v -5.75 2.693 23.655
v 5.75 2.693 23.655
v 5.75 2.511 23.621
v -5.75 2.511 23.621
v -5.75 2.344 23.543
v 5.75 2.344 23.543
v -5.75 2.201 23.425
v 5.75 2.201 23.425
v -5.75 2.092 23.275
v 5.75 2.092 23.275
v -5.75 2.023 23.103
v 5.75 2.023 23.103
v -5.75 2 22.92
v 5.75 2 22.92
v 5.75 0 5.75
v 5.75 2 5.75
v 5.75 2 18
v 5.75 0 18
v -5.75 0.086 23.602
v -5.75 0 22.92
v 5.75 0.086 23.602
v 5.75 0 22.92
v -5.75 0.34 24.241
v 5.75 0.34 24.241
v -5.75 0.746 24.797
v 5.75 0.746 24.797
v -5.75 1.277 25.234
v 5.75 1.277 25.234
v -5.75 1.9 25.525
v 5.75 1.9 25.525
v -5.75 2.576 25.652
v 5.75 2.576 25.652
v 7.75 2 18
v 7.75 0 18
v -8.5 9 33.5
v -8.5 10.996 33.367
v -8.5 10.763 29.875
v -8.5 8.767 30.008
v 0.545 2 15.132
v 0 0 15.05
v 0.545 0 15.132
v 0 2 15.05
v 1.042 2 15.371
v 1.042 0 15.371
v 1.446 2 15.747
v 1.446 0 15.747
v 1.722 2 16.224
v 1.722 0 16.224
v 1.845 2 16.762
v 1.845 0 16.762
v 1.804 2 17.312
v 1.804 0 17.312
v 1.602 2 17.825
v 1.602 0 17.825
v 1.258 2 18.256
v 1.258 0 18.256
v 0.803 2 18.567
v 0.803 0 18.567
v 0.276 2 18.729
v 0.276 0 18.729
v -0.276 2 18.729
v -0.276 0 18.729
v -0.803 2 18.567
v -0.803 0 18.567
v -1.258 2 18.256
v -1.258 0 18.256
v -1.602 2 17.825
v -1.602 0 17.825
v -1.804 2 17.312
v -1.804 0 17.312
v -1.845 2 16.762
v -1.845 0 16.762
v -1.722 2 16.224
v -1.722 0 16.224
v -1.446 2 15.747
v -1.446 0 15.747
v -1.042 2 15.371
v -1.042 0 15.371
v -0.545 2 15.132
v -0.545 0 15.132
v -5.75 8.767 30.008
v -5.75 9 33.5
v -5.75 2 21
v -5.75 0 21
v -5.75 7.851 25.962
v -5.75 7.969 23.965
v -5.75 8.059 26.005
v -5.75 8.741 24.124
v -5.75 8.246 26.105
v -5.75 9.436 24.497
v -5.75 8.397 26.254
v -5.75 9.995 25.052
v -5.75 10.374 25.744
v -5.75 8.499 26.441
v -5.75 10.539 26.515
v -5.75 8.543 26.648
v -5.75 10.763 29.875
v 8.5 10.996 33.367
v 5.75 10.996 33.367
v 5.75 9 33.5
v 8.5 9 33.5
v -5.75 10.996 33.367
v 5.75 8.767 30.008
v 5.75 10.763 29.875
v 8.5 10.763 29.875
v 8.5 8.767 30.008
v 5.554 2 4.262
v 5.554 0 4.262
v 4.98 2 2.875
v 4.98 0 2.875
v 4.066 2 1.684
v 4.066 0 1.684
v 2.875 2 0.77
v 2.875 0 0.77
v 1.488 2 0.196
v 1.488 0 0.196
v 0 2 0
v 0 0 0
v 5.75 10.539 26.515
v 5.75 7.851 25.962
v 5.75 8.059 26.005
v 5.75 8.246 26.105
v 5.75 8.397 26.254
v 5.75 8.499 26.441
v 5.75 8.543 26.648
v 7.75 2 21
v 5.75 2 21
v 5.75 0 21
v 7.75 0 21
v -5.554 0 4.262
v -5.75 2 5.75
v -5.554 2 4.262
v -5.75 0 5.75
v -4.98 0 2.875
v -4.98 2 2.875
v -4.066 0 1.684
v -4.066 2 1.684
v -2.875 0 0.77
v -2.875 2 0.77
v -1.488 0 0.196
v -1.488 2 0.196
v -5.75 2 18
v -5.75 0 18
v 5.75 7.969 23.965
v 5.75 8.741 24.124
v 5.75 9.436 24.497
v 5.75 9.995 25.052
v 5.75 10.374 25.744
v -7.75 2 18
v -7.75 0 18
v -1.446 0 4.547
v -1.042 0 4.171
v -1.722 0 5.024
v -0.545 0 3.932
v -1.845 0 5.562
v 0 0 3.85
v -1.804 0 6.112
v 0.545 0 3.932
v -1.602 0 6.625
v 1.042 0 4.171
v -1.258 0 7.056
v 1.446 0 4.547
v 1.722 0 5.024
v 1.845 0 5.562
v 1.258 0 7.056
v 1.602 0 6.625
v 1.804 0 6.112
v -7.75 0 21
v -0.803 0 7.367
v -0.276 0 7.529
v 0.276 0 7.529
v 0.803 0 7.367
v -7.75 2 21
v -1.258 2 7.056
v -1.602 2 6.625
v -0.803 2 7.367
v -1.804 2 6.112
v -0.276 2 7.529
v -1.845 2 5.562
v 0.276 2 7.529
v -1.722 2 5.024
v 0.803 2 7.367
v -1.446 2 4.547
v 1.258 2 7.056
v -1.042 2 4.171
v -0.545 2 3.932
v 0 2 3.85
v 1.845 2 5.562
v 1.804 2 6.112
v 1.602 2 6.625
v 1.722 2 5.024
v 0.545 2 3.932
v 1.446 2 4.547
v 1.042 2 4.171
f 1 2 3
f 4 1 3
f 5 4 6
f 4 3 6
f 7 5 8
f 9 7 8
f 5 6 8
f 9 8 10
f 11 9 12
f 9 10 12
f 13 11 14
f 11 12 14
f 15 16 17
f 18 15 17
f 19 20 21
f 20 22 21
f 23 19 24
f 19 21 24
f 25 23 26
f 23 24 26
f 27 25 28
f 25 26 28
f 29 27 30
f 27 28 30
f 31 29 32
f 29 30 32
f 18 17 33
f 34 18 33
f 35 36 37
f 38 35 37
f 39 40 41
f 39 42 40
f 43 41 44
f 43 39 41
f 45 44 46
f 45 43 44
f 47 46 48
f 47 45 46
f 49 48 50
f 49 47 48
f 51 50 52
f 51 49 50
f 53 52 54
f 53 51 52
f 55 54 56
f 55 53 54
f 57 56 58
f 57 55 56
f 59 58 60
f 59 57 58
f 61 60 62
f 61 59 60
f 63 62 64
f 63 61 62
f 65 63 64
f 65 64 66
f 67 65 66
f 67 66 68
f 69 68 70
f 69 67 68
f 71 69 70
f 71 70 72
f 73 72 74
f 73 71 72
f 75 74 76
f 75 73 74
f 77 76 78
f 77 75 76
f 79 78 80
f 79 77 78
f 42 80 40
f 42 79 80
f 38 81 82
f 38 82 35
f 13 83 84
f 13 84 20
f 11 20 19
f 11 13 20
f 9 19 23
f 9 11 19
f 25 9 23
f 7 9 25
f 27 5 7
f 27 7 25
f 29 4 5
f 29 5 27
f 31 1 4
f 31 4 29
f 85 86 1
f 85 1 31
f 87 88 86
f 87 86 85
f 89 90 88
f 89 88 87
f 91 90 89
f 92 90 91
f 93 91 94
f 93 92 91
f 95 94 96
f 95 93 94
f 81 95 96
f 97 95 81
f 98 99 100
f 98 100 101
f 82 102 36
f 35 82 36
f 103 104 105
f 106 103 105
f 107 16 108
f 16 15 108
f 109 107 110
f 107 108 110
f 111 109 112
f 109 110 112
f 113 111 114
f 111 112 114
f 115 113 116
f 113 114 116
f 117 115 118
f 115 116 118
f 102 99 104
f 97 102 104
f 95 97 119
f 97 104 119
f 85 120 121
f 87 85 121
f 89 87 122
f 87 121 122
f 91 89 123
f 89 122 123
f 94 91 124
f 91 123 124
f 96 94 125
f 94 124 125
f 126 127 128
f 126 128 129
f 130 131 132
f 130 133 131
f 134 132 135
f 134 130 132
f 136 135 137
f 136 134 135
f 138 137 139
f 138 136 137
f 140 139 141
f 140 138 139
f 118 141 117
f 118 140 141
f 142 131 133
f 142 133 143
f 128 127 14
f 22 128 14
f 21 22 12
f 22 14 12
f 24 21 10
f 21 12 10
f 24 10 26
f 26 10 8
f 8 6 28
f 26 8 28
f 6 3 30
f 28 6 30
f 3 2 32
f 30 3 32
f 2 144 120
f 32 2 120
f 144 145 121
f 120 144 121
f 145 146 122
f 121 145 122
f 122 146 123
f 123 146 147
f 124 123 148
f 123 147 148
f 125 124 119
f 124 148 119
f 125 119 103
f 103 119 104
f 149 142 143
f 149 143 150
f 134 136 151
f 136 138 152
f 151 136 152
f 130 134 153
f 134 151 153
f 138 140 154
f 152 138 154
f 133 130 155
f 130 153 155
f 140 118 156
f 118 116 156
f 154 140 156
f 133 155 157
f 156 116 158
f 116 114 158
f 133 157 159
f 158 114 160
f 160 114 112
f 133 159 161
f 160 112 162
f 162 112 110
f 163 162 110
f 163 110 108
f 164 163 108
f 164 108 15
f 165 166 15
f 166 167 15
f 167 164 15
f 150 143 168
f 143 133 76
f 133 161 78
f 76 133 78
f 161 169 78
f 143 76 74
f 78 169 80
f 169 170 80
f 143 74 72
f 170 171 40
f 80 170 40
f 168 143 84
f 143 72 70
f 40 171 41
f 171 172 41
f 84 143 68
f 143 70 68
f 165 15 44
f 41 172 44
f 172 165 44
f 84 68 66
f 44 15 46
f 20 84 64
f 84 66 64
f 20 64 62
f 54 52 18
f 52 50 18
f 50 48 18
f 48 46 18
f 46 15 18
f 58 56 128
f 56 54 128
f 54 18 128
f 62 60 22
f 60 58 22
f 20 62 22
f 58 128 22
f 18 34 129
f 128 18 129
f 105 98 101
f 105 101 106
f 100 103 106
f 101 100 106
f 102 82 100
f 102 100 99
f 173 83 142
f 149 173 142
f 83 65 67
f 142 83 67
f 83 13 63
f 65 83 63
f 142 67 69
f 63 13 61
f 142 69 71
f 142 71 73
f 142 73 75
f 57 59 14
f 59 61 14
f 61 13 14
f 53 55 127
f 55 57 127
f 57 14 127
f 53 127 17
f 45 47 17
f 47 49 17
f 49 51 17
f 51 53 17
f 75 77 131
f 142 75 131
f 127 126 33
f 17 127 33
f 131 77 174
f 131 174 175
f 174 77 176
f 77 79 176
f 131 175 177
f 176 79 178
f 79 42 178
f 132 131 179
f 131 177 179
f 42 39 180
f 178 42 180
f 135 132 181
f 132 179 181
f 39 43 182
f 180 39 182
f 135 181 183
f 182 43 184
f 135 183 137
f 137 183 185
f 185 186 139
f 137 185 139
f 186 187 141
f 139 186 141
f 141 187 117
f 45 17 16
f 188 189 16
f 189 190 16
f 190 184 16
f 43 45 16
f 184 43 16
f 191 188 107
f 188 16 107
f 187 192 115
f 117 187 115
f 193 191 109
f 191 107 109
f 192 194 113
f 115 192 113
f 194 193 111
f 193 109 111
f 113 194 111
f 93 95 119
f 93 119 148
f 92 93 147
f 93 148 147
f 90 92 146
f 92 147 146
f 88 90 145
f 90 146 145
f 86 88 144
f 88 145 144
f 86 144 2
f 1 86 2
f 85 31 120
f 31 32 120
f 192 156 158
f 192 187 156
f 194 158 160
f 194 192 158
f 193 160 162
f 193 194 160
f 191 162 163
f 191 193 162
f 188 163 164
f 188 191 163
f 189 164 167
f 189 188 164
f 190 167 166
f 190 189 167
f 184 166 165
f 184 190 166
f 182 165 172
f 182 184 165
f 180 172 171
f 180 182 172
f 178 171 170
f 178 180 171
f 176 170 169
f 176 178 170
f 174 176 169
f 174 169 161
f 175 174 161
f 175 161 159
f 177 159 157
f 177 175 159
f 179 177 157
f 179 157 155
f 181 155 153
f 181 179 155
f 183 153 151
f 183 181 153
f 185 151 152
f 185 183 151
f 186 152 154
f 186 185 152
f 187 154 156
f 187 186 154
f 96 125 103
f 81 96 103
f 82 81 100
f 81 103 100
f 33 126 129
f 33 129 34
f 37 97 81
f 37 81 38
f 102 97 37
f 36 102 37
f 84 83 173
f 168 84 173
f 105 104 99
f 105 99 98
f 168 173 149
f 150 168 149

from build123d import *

# Parameters (mm, degrees)
T_LE_DE_BASE_PLI_E1_DEPTH = 5.75
ESQUISSE6_W               = 2
ESQUISSE6_H               = 3
PATTE1_DEPTH              = 2
ESQUISSE9_W               = 2.75
ESQUISSE9_H               = 3.5
PATTE2_DEPTH              = 2
ESQUISSE12_R              = 1.85
ENL_V_MAT_EXTRU_1_DEPTH   = 10
CONG_1_R                  = 5.75


# Sheet-metal steps are written as plain solids
with BuildPart() as part:
    # Esquisse1 → Tôle de base pliée1 (new body)
    with BuildSketch(Plane(origin=(0, 0, 0), x_dir=(0, 0, -1), z_dir=(1, 0, 0))):
        with BuildLine():
            Line((0, 0), (-22.919645957, 0))
            ThreePointArc((-22.919645957, 0), (-24.797039301, 0.745526473), (-25.651523607, 2.575901315))
            Line((-25.651523607, 2.575901315), (-25.961852844, 7.85149835))
            ThreePointArc((-25.961852844, 7.85149835), (-26.174296323, 8.327060048), (-26.648183844, 8.543212256))
            Line((-26.648183844, 8.543212256), (-33.5, 9))
            Line((-33.5, 9), (-33.366961979, 10.995570316))
            Line((-33.366961979, 10.995570316), (-26.515145823, 10.538782572))
            ThreePointArc((-26.515145823, 10.538782572), (-24.754569405, 9.735738676), (-23.965304098, 7.968942394))
            Line((-23.965304098, 7.968942394), (-23.65497486, 2.693345359))
            ThreePointArc((-23.65497486, 2.693345359), (-23.424976637, 2.200670467), (-22.919645957, 2))
            Line((-22.919645957, 2), (0, 2))
            Line((0, 2), (0, 0))
        make_face()
    extrude(amount=T_LE_DE_BASE_PLI_E1_DEPTH)

    # Esquisse6 → Patte1 (add)
    with BuildSketch(Plane(origin=(0, 2, 0), x_dir=(1, 0, 0), z_dir=(0, 1, 0))):
        with Locations((6.75, -19.5)):
            Rectangle(ESQUISSE6_W, ESQUISSE6_H)
    extrude(amount=-PATTE1_DEPTH)

    # Esquisse9 → Patte2 (add)
    with BuildSketch(Plane(origin=(0, 8.732295979, -0.582153065), x_dir=(1, 0, 0), z_dir=(0, 0.997785157856609, -0.06651901052377376))):
        with Locations((7.125, -32.274473883)):
            Rectangle(ESQUISSE9_W, ESQUISSE9_H)
    extrude(amount=-PATTE2_DEPTH)

    # Esquisse12 → Enlèv. mat.-Extru.1 (cut)
    with BuildSketch(Plane(origin=(0, 2, 0), x_dir=(1, 0, 0), z_dir=(0, 1, 0))):
        with Locations((0, -5.7)):
            Circle(ESQUISSE12_R)
        with Locations((0, -16.9)):
            Circle(ESQUISSE12_R)
    extrude(amount=-ENL_V_MAT_EXTRU_1_DEPTH, mode=Mode.SUBTRACT)

    # Congé1
    cong_1_edges = [part.edges().sort_by_distance(p)[0] for p in [
        (5.75, 1, 0),
    ]]
    fillet(cong_1_edges, radius=CONG_1_R - 0.0001)  # a hair under: the kernel refuses the full size

    # Symétrie1: part across plane


with BuildPart() as part_1:
    add(part.part)
    add(part.part.mirror(Plane(origin=(0, 2.693345359, 23.65497486), x_dir=(0, 0, 1), z_dir=(-1, 0, 0))))


solid = part_1.part
